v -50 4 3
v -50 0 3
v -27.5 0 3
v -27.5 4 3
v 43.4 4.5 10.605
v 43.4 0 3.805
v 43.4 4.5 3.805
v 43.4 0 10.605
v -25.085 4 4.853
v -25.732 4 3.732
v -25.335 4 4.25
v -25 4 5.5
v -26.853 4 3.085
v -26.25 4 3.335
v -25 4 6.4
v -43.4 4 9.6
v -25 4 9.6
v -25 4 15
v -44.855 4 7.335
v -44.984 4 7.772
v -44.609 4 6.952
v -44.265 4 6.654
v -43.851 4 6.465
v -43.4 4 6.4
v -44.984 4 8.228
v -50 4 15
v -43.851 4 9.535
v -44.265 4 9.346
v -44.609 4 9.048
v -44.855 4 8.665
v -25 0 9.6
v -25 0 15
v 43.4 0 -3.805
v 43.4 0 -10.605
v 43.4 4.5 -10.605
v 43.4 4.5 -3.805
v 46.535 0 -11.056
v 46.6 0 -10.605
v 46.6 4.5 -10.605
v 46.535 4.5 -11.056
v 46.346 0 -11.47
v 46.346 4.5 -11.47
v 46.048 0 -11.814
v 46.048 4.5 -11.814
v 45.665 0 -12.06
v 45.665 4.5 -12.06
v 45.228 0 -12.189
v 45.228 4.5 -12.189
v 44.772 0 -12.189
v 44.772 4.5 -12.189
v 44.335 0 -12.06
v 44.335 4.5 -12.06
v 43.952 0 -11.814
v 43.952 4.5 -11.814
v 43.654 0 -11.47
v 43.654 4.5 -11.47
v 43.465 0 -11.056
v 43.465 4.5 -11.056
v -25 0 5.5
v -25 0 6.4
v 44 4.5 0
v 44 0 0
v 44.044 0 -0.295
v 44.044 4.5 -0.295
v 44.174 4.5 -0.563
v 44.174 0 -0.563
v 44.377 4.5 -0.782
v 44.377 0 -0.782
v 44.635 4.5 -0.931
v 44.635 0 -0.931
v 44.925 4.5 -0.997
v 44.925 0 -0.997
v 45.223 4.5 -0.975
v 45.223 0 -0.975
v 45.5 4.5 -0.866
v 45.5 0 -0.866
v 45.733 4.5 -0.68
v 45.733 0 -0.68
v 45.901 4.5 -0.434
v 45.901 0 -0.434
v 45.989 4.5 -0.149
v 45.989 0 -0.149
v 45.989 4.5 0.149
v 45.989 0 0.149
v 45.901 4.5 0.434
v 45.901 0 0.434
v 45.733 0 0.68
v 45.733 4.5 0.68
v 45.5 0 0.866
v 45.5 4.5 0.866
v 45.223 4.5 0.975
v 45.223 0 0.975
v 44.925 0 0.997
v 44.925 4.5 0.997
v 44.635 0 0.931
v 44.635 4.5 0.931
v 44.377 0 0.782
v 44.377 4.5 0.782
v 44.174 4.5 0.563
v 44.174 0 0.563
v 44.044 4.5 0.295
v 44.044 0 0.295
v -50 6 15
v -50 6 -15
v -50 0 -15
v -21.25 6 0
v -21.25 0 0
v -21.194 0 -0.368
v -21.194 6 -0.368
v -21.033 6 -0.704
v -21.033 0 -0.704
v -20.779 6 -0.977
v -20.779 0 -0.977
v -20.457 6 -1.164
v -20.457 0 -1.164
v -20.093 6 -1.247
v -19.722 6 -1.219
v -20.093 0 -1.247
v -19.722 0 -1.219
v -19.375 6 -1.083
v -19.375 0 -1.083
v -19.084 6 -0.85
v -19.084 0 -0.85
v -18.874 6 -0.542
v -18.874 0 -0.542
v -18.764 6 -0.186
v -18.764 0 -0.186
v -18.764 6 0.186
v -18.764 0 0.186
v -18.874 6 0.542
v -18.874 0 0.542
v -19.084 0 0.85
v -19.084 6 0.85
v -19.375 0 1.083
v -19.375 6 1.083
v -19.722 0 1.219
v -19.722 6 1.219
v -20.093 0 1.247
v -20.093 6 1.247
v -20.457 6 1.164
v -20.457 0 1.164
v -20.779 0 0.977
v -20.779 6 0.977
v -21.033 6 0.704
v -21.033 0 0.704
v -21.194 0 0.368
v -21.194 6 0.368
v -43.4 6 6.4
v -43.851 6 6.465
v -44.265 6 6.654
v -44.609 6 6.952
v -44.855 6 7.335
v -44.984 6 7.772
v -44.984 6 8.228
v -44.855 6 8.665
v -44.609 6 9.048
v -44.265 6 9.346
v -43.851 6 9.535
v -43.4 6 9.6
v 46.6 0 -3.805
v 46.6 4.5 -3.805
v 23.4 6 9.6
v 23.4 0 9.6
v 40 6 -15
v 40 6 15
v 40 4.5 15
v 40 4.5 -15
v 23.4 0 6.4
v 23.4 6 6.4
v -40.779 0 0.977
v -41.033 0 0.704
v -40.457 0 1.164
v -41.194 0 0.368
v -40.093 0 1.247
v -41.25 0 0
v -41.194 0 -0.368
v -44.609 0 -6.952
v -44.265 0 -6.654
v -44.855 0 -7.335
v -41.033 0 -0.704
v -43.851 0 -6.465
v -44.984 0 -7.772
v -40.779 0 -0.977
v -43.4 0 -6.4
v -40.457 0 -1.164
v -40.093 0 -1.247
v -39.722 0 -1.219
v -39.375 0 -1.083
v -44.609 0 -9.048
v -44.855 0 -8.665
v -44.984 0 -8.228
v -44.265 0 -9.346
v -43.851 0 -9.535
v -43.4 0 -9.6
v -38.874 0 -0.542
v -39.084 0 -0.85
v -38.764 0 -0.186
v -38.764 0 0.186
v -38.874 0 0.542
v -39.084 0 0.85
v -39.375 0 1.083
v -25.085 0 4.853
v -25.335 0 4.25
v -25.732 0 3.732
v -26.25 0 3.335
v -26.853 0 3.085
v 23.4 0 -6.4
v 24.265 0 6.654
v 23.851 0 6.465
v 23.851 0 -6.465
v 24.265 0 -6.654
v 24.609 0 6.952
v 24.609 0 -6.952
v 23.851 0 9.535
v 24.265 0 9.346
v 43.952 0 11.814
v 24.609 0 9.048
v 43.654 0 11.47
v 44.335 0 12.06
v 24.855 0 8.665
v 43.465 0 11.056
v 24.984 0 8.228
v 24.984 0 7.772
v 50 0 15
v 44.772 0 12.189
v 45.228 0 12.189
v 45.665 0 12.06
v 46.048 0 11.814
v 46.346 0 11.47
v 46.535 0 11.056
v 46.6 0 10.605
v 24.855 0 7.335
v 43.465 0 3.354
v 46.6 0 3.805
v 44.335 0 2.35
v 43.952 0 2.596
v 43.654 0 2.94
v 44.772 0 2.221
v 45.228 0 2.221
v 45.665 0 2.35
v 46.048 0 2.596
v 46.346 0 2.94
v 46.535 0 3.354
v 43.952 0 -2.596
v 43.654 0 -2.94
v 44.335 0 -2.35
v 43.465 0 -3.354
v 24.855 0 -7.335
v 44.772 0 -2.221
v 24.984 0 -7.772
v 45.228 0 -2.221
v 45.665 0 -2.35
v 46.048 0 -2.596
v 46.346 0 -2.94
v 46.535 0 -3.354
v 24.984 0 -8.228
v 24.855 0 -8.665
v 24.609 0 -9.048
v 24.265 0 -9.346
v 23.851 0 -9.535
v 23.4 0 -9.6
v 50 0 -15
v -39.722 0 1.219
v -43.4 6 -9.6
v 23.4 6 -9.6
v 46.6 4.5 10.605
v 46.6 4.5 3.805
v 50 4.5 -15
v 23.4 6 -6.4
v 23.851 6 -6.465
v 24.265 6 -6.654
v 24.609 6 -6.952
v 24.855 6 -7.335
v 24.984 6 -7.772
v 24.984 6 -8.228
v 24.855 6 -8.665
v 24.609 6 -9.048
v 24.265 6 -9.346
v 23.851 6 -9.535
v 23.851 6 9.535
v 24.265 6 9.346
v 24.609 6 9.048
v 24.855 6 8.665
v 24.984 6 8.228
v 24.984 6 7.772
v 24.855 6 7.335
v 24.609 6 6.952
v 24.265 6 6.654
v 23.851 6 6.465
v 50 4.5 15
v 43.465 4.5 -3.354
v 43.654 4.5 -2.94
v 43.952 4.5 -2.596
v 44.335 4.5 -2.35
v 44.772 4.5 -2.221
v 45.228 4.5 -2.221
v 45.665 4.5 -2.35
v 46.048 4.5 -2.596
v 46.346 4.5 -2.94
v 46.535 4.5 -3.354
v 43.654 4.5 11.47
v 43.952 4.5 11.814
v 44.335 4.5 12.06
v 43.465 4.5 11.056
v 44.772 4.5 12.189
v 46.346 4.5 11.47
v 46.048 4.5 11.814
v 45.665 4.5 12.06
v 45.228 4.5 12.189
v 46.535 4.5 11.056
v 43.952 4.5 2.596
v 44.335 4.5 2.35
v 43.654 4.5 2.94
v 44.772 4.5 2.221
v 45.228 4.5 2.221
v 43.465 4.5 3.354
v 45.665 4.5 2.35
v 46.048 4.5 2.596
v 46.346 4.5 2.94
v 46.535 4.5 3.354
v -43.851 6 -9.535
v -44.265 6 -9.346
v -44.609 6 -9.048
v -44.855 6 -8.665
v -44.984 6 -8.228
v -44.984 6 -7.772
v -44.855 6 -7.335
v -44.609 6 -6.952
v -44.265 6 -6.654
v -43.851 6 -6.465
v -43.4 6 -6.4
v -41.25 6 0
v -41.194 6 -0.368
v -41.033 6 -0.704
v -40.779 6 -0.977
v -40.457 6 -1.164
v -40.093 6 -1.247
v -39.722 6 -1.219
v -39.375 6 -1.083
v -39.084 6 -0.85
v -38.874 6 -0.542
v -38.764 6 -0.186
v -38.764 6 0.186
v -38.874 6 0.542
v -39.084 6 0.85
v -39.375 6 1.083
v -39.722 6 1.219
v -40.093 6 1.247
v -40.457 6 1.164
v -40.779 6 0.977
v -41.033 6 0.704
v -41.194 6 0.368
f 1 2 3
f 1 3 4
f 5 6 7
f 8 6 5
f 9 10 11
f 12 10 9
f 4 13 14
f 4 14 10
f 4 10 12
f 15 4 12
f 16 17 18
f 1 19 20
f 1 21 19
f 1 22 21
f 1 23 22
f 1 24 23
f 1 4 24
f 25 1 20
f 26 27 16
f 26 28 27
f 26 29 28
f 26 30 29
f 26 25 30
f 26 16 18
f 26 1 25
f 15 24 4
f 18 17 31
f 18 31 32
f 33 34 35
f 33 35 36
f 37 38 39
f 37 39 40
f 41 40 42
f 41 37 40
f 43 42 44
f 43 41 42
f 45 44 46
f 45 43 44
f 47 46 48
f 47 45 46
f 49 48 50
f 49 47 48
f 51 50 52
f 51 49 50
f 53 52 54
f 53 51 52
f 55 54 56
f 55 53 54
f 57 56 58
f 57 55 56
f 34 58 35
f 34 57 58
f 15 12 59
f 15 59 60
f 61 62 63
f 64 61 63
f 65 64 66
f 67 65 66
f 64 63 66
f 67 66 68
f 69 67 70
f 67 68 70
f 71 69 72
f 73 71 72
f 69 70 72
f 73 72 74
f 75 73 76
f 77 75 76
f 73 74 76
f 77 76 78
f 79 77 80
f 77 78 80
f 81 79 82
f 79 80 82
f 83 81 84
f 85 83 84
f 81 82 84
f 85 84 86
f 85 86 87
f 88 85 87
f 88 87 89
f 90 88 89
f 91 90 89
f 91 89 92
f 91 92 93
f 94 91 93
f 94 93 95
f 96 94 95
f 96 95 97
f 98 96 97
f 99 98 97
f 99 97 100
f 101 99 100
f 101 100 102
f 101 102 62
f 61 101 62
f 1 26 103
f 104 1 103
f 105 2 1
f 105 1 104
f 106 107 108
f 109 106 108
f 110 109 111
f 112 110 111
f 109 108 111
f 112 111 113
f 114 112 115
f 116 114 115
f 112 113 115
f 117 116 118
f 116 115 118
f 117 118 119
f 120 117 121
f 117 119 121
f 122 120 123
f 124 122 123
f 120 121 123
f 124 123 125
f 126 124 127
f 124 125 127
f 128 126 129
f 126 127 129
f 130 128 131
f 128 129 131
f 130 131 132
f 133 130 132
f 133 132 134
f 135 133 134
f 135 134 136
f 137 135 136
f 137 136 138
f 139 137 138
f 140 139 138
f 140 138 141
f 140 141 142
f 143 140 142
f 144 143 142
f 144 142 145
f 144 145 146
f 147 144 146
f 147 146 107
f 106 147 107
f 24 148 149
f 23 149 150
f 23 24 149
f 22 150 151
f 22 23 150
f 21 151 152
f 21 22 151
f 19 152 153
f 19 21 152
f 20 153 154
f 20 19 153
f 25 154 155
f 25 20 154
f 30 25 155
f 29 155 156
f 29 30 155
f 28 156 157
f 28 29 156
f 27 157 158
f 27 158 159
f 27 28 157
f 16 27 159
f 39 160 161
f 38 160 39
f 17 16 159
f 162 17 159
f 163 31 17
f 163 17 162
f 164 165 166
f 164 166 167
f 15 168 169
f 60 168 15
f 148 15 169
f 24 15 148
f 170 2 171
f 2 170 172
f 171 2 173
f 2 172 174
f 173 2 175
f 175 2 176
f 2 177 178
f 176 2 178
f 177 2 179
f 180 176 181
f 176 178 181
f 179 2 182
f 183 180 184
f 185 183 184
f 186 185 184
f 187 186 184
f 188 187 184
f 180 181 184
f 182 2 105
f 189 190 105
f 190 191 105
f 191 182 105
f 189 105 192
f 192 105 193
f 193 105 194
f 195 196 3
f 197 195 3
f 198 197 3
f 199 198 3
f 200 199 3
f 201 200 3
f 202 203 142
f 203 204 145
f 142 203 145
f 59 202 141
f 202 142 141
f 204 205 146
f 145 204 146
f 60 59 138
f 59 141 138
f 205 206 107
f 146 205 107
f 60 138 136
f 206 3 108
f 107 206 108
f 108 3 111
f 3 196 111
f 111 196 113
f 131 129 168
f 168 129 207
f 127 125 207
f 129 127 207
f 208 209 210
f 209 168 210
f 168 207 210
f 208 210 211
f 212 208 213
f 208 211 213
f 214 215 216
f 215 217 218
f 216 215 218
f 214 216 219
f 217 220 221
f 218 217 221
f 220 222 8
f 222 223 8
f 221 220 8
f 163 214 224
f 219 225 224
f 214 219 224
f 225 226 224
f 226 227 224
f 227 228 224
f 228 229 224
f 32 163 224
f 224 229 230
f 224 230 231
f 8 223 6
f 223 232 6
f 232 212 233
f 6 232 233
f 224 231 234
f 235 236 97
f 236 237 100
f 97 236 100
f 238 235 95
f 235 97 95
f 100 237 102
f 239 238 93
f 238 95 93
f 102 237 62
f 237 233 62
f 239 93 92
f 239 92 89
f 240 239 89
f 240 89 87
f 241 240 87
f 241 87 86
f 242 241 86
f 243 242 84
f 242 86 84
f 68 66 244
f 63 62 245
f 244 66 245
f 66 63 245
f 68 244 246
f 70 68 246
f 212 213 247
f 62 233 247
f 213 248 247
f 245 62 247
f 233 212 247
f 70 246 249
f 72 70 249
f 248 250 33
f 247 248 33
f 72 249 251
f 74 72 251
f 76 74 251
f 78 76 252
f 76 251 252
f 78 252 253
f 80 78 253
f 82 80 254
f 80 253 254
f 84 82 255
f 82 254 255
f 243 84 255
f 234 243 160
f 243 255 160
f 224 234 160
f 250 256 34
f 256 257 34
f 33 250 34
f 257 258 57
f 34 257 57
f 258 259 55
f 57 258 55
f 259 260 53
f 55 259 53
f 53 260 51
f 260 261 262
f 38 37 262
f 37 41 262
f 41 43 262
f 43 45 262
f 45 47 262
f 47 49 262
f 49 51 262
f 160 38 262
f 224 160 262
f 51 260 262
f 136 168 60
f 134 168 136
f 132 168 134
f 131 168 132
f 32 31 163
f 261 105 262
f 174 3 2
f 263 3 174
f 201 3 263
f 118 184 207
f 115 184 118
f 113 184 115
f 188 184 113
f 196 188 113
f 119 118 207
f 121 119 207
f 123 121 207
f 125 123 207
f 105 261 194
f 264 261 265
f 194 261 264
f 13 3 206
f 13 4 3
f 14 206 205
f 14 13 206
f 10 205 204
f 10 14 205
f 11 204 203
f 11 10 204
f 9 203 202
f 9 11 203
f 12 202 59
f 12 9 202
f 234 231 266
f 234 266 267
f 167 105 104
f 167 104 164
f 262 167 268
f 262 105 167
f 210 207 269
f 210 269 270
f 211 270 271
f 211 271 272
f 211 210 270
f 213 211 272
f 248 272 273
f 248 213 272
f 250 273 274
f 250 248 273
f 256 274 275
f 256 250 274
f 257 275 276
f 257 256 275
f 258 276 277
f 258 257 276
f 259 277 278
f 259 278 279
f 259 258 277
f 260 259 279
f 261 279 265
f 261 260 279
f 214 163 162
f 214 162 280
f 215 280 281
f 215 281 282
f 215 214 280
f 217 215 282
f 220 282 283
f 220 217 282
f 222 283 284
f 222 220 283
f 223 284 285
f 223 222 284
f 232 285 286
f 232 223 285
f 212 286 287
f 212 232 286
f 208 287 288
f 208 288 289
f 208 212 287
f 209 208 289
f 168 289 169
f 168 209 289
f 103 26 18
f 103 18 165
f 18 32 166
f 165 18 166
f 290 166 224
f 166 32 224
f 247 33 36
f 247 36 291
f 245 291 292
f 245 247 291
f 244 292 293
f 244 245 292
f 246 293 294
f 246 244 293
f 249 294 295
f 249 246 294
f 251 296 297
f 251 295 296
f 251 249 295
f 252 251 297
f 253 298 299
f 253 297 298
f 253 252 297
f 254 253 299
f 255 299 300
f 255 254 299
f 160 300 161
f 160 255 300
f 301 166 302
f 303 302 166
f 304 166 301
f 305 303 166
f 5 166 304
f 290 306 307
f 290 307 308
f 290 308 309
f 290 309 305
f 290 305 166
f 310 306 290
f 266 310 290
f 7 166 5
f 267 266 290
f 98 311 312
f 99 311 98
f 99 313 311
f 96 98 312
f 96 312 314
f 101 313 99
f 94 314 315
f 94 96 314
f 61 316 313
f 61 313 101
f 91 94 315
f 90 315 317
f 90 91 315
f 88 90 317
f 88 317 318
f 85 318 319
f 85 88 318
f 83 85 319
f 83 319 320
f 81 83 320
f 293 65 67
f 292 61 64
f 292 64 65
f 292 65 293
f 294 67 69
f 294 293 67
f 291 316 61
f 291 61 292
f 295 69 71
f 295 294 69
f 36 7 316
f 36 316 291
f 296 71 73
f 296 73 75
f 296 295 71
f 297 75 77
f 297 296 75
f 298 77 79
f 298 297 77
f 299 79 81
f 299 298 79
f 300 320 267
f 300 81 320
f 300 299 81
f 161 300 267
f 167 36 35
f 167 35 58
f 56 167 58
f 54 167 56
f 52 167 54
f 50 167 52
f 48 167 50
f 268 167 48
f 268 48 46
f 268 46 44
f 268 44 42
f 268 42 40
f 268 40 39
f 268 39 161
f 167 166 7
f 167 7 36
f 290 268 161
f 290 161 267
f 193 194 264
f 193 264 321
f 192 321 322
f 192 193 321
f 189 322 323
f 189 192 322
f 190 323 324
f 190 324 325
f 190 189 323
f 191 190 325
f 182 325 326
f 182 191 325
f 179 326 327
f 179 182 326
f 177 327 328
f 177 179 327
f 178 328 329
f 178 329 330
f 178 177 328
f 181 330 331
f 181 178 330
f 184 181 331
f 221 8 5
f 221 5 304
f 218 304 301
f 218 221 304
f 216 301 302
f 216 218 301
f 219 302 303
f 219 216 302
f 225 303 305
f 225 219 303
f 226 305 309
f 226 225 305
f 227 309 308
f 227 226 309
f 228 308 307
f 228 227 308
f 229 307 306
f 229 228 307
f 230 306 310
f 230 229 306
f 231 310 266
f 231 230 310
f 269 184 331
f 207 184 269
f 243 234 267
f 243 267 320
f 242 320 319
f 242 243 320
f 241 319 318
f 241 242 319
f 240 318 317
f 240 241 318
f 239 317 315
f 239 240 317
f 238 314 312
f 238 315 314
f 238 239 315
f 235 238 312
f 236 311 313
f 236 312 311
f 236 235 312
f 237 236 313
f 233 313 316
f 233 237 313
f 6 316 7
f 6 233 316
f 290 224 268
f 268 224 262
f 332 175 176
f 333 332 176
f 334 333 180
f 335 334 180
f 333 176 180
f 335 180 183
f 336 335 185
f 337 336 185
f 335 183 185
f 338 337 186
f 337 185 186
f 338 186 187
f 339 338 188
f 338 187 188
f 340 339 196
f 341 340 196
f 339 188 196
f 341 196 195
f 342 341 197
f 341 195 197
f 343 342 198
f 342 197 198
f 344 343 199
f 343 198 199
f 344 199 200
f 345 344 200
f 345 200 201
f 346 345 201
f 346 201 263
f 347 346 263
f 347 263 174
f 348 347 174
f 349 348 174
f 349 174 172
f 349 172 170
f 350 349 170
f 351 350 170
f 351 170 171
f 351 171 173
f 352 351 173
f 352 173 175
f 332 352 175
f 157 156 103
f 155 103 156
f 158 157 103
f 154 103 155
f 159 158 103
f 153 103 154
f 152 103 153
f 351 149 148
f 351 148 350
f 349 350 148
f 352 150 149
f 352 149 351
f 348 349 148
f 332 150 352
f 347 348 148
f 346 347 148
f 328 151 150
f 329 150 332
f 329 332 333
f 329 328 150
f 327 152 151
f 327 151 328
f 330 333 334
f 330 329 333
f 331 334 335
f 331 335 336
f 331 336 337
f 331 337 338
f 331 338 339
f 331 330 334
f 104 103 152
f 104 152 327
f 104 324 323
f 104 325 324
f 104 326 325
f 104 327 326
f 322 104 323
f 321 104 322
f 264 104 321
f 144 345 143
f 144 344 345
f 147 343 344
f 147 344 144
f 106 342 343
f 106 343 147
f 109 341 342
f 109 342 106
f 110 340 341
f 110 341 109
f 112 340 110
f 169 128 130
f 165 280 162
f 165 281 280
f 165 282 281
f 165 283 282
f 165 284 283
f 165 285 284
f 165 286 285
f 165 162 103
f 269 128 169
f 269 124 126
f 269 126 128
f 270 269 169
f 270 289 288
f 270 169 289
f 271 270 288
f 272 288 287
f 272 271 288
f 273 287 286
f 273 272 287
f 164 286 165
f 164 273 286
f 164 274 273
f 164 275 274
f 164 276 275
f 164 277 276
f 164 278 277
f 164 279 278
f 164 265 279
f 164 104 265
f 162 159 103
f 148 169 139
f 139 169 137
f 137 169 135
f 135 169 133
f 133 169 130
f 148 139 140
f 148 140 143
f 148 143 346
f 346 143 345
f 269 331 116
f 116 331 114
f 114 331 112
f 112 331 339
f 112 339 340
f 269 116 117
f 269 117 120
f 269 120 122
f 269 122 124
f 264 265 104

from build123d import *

# Parameters (mm, degrees)
SKIZZE1_W                       = 100
SKIZZE1_H                       = 30
AUFSATZ_LINEAR_AUSTRAGEN1_DEPTH = 6
DURCHGANGSLOCH_F_R_M31_DEPTH    = 6
DURCHGANGSLOCH_F_R_M32_DEPTH    = 6
M3_GEWINDEBOHRUNG1_D            = 2.5
SKIZZE12_W                      = 12
SKIZZE12_H                      = 4
SCHNITT_LINEAR_AUSTRAGEN1_DEPTH = 25
VERRUNDUNG1_R                   = 2.5
SKIZZE13_W                      = 10
SKIZZE13_H                      = 30
SCHNITT_LINEAR_AUSTRAGEN2_DEPTH = 1.5
F_2_0MM_STIFTLOCH1_D            = 2
F_2_0MM_STIFTLOCH1_DEPTH        = 8.5
F_2_0MM_STIFTLOCH1_TIP          = 0.600860619


# Read off the part's stored shape, not the designer's step: Durchgangsloch für M31, Durchgangsloch für M32
with BuildPart() as part:
    # Skizze1 → Aufsatz-Linear austragen1 (new body)
    with BuildSketch(Plane(origin=(0, 0, 0), x_dir=(1, 0, 0), z_dir=(0, 1, 0))):
        Rectangle(SKIZZE1_W, SKIZZE1_H)
    extrude(amount=AUFSATZ_LINEAR_AUSTRAGEN1_DEPTH)

    # Durchgangsloch für M31 outline → Durchgangsloch für M31 (cut)
    with BuildSketch(Plane(origin=(0, 0, 0), x_dir=(1, 0, 0), z_dir=(0, 1, 0))):
        with BuildLine():
            Line((-43.4, -9.6), (23.4, -9.6))
            ThreePointArc((23.4, -9.6), (25, -8), (23.4, -6.4))
            Line((23.4, -6.4), (-43.4, -6.4))
            ThreePointArc((-43.4, -6.4), (-45, -8), (-43.4, -9.6))
        make_face()
        with BuildLine():
            Line((-43.4, 6.4), (23.4, 6.4))
            ThreePointArc((23.4, 6.4), (25, 8), (23.4, 9.6))
            Line((23.4, 9.6), (-43.4, 9.6))
            ThreePointArc((-43.4, 9.6), (-45, 8), (-43.4, 6.4))
        make_face()
    extrude(amount=DURCHGANGSLOCH_F_R_M31_DEPTH, mode=Mode.SUBTRACT)

    # Durchgangsloch für M32 outline → Durchgangsloch für M32 (cut)
    with BuildSketch(Plane(origin=(0, 0, 0), x_dir=(1, 0, 0), z_dir=(0, 1, 0))):
        with BuildLine():
            ThreePointArc((46.6, 10.605062793), (45, 12.205062793), (43.4, 10.605062793))
            Line((43.4, 10.605062793), (43.4, 3.805062793))
            ThreePointArc((43.4, 3.805062793), (45, 2.205062793), (46.6, 3.805062793))
            Line((46.6, 3.805062793), (46.6, 10.605062793))
        make_face()
        with BuildLine():
            Line((46.6, -10.605062793), (46.6, -3.805062793))
            ThreePointArc((46.6, -3.805062793), (45, -2.205062793), (43.4, -3.805062793))
            Line((43.4, -3.805062793), (43.4, -10.605062793))
            ThreePointArc((43.4, -10.605062793), (45, -12.205062793), (46.6, -10.605062793))
        make_face()
    extrude(amount=DURCHGANGSLOCH_F_R_M32_DEPTH, mode=Mode.SUBTRACT)

    # M3 Gewindebohrung1 (through all)
    with Locations(Plane(origin=(0, 6, 0), x_dir=(1, 0, 0), z_dir=(0, 1, 0))):
        with Locations((-40, 0), (-20, 0)):
            Hole(M3_GEWINDEBOHRUNG1_D / 2)

    # Skizze12 → Schnitt-Linear austragen1 (cut)
    with BuildSketch(Plane.ZY.offset(50)):
        with Locations((9, 2)):
            Rectangle(SKIZZE12_W, SKIZZE12_H)
    extrude(amount=-SCHNITT_LINEAR_AUSTRAGEN1_DEPTH, mode=Mode.SUBTRACT)

    # Verrundung1
    verrundung1_edges = [part.edges().sort_by_distance(p)[0] for p in [
        (-25, 2, 3),
    ]]
    fillet(verrundung1_edges, radius=VERRUNDUNG1_R)

    # Skizze13 → Schnitt-Linear austragen2 (cut)
    with BuildSketch(Plane(origin=(0, 6, 0), x_dir=(1, 0, 0), z_dir=(0, 1, 0))):
        with Locations((45, 0)):
            Rectangle(SKIZZE13_W, SKIZZE13_H)
    extrude(amount=-SCHNITT_LINEAR_AUSTRAGEN2_DEPTH, mode=Mode.SUBTRACT)

    # Ø2.0mm Stiftloch1
    with Locations(Plane(origin=(0, 4.5, 0), x_dir=(1, 0, 0), z_dir=(0, 1, 0))):
        with Locations((45, 0)):
            Hole(F_2_0MM_STIFTLOCH1_D / 2, depth=F_2_0MM_STIFTLOCH1_DEPTH)
            with Locations((0, 0, -(F_2_0MM_STIFTLOCH1_DEPTH + F_2_0MM_STIFTLOCH1_TIP / 2))):  # 118° drill point
                Cone(0, F_2_0MM_STIFTLOCH1_D / 2, F_2_0MM_STIFTLOCH1_TIP, mode=Mode.SUBTRACT)


solid = part.part
